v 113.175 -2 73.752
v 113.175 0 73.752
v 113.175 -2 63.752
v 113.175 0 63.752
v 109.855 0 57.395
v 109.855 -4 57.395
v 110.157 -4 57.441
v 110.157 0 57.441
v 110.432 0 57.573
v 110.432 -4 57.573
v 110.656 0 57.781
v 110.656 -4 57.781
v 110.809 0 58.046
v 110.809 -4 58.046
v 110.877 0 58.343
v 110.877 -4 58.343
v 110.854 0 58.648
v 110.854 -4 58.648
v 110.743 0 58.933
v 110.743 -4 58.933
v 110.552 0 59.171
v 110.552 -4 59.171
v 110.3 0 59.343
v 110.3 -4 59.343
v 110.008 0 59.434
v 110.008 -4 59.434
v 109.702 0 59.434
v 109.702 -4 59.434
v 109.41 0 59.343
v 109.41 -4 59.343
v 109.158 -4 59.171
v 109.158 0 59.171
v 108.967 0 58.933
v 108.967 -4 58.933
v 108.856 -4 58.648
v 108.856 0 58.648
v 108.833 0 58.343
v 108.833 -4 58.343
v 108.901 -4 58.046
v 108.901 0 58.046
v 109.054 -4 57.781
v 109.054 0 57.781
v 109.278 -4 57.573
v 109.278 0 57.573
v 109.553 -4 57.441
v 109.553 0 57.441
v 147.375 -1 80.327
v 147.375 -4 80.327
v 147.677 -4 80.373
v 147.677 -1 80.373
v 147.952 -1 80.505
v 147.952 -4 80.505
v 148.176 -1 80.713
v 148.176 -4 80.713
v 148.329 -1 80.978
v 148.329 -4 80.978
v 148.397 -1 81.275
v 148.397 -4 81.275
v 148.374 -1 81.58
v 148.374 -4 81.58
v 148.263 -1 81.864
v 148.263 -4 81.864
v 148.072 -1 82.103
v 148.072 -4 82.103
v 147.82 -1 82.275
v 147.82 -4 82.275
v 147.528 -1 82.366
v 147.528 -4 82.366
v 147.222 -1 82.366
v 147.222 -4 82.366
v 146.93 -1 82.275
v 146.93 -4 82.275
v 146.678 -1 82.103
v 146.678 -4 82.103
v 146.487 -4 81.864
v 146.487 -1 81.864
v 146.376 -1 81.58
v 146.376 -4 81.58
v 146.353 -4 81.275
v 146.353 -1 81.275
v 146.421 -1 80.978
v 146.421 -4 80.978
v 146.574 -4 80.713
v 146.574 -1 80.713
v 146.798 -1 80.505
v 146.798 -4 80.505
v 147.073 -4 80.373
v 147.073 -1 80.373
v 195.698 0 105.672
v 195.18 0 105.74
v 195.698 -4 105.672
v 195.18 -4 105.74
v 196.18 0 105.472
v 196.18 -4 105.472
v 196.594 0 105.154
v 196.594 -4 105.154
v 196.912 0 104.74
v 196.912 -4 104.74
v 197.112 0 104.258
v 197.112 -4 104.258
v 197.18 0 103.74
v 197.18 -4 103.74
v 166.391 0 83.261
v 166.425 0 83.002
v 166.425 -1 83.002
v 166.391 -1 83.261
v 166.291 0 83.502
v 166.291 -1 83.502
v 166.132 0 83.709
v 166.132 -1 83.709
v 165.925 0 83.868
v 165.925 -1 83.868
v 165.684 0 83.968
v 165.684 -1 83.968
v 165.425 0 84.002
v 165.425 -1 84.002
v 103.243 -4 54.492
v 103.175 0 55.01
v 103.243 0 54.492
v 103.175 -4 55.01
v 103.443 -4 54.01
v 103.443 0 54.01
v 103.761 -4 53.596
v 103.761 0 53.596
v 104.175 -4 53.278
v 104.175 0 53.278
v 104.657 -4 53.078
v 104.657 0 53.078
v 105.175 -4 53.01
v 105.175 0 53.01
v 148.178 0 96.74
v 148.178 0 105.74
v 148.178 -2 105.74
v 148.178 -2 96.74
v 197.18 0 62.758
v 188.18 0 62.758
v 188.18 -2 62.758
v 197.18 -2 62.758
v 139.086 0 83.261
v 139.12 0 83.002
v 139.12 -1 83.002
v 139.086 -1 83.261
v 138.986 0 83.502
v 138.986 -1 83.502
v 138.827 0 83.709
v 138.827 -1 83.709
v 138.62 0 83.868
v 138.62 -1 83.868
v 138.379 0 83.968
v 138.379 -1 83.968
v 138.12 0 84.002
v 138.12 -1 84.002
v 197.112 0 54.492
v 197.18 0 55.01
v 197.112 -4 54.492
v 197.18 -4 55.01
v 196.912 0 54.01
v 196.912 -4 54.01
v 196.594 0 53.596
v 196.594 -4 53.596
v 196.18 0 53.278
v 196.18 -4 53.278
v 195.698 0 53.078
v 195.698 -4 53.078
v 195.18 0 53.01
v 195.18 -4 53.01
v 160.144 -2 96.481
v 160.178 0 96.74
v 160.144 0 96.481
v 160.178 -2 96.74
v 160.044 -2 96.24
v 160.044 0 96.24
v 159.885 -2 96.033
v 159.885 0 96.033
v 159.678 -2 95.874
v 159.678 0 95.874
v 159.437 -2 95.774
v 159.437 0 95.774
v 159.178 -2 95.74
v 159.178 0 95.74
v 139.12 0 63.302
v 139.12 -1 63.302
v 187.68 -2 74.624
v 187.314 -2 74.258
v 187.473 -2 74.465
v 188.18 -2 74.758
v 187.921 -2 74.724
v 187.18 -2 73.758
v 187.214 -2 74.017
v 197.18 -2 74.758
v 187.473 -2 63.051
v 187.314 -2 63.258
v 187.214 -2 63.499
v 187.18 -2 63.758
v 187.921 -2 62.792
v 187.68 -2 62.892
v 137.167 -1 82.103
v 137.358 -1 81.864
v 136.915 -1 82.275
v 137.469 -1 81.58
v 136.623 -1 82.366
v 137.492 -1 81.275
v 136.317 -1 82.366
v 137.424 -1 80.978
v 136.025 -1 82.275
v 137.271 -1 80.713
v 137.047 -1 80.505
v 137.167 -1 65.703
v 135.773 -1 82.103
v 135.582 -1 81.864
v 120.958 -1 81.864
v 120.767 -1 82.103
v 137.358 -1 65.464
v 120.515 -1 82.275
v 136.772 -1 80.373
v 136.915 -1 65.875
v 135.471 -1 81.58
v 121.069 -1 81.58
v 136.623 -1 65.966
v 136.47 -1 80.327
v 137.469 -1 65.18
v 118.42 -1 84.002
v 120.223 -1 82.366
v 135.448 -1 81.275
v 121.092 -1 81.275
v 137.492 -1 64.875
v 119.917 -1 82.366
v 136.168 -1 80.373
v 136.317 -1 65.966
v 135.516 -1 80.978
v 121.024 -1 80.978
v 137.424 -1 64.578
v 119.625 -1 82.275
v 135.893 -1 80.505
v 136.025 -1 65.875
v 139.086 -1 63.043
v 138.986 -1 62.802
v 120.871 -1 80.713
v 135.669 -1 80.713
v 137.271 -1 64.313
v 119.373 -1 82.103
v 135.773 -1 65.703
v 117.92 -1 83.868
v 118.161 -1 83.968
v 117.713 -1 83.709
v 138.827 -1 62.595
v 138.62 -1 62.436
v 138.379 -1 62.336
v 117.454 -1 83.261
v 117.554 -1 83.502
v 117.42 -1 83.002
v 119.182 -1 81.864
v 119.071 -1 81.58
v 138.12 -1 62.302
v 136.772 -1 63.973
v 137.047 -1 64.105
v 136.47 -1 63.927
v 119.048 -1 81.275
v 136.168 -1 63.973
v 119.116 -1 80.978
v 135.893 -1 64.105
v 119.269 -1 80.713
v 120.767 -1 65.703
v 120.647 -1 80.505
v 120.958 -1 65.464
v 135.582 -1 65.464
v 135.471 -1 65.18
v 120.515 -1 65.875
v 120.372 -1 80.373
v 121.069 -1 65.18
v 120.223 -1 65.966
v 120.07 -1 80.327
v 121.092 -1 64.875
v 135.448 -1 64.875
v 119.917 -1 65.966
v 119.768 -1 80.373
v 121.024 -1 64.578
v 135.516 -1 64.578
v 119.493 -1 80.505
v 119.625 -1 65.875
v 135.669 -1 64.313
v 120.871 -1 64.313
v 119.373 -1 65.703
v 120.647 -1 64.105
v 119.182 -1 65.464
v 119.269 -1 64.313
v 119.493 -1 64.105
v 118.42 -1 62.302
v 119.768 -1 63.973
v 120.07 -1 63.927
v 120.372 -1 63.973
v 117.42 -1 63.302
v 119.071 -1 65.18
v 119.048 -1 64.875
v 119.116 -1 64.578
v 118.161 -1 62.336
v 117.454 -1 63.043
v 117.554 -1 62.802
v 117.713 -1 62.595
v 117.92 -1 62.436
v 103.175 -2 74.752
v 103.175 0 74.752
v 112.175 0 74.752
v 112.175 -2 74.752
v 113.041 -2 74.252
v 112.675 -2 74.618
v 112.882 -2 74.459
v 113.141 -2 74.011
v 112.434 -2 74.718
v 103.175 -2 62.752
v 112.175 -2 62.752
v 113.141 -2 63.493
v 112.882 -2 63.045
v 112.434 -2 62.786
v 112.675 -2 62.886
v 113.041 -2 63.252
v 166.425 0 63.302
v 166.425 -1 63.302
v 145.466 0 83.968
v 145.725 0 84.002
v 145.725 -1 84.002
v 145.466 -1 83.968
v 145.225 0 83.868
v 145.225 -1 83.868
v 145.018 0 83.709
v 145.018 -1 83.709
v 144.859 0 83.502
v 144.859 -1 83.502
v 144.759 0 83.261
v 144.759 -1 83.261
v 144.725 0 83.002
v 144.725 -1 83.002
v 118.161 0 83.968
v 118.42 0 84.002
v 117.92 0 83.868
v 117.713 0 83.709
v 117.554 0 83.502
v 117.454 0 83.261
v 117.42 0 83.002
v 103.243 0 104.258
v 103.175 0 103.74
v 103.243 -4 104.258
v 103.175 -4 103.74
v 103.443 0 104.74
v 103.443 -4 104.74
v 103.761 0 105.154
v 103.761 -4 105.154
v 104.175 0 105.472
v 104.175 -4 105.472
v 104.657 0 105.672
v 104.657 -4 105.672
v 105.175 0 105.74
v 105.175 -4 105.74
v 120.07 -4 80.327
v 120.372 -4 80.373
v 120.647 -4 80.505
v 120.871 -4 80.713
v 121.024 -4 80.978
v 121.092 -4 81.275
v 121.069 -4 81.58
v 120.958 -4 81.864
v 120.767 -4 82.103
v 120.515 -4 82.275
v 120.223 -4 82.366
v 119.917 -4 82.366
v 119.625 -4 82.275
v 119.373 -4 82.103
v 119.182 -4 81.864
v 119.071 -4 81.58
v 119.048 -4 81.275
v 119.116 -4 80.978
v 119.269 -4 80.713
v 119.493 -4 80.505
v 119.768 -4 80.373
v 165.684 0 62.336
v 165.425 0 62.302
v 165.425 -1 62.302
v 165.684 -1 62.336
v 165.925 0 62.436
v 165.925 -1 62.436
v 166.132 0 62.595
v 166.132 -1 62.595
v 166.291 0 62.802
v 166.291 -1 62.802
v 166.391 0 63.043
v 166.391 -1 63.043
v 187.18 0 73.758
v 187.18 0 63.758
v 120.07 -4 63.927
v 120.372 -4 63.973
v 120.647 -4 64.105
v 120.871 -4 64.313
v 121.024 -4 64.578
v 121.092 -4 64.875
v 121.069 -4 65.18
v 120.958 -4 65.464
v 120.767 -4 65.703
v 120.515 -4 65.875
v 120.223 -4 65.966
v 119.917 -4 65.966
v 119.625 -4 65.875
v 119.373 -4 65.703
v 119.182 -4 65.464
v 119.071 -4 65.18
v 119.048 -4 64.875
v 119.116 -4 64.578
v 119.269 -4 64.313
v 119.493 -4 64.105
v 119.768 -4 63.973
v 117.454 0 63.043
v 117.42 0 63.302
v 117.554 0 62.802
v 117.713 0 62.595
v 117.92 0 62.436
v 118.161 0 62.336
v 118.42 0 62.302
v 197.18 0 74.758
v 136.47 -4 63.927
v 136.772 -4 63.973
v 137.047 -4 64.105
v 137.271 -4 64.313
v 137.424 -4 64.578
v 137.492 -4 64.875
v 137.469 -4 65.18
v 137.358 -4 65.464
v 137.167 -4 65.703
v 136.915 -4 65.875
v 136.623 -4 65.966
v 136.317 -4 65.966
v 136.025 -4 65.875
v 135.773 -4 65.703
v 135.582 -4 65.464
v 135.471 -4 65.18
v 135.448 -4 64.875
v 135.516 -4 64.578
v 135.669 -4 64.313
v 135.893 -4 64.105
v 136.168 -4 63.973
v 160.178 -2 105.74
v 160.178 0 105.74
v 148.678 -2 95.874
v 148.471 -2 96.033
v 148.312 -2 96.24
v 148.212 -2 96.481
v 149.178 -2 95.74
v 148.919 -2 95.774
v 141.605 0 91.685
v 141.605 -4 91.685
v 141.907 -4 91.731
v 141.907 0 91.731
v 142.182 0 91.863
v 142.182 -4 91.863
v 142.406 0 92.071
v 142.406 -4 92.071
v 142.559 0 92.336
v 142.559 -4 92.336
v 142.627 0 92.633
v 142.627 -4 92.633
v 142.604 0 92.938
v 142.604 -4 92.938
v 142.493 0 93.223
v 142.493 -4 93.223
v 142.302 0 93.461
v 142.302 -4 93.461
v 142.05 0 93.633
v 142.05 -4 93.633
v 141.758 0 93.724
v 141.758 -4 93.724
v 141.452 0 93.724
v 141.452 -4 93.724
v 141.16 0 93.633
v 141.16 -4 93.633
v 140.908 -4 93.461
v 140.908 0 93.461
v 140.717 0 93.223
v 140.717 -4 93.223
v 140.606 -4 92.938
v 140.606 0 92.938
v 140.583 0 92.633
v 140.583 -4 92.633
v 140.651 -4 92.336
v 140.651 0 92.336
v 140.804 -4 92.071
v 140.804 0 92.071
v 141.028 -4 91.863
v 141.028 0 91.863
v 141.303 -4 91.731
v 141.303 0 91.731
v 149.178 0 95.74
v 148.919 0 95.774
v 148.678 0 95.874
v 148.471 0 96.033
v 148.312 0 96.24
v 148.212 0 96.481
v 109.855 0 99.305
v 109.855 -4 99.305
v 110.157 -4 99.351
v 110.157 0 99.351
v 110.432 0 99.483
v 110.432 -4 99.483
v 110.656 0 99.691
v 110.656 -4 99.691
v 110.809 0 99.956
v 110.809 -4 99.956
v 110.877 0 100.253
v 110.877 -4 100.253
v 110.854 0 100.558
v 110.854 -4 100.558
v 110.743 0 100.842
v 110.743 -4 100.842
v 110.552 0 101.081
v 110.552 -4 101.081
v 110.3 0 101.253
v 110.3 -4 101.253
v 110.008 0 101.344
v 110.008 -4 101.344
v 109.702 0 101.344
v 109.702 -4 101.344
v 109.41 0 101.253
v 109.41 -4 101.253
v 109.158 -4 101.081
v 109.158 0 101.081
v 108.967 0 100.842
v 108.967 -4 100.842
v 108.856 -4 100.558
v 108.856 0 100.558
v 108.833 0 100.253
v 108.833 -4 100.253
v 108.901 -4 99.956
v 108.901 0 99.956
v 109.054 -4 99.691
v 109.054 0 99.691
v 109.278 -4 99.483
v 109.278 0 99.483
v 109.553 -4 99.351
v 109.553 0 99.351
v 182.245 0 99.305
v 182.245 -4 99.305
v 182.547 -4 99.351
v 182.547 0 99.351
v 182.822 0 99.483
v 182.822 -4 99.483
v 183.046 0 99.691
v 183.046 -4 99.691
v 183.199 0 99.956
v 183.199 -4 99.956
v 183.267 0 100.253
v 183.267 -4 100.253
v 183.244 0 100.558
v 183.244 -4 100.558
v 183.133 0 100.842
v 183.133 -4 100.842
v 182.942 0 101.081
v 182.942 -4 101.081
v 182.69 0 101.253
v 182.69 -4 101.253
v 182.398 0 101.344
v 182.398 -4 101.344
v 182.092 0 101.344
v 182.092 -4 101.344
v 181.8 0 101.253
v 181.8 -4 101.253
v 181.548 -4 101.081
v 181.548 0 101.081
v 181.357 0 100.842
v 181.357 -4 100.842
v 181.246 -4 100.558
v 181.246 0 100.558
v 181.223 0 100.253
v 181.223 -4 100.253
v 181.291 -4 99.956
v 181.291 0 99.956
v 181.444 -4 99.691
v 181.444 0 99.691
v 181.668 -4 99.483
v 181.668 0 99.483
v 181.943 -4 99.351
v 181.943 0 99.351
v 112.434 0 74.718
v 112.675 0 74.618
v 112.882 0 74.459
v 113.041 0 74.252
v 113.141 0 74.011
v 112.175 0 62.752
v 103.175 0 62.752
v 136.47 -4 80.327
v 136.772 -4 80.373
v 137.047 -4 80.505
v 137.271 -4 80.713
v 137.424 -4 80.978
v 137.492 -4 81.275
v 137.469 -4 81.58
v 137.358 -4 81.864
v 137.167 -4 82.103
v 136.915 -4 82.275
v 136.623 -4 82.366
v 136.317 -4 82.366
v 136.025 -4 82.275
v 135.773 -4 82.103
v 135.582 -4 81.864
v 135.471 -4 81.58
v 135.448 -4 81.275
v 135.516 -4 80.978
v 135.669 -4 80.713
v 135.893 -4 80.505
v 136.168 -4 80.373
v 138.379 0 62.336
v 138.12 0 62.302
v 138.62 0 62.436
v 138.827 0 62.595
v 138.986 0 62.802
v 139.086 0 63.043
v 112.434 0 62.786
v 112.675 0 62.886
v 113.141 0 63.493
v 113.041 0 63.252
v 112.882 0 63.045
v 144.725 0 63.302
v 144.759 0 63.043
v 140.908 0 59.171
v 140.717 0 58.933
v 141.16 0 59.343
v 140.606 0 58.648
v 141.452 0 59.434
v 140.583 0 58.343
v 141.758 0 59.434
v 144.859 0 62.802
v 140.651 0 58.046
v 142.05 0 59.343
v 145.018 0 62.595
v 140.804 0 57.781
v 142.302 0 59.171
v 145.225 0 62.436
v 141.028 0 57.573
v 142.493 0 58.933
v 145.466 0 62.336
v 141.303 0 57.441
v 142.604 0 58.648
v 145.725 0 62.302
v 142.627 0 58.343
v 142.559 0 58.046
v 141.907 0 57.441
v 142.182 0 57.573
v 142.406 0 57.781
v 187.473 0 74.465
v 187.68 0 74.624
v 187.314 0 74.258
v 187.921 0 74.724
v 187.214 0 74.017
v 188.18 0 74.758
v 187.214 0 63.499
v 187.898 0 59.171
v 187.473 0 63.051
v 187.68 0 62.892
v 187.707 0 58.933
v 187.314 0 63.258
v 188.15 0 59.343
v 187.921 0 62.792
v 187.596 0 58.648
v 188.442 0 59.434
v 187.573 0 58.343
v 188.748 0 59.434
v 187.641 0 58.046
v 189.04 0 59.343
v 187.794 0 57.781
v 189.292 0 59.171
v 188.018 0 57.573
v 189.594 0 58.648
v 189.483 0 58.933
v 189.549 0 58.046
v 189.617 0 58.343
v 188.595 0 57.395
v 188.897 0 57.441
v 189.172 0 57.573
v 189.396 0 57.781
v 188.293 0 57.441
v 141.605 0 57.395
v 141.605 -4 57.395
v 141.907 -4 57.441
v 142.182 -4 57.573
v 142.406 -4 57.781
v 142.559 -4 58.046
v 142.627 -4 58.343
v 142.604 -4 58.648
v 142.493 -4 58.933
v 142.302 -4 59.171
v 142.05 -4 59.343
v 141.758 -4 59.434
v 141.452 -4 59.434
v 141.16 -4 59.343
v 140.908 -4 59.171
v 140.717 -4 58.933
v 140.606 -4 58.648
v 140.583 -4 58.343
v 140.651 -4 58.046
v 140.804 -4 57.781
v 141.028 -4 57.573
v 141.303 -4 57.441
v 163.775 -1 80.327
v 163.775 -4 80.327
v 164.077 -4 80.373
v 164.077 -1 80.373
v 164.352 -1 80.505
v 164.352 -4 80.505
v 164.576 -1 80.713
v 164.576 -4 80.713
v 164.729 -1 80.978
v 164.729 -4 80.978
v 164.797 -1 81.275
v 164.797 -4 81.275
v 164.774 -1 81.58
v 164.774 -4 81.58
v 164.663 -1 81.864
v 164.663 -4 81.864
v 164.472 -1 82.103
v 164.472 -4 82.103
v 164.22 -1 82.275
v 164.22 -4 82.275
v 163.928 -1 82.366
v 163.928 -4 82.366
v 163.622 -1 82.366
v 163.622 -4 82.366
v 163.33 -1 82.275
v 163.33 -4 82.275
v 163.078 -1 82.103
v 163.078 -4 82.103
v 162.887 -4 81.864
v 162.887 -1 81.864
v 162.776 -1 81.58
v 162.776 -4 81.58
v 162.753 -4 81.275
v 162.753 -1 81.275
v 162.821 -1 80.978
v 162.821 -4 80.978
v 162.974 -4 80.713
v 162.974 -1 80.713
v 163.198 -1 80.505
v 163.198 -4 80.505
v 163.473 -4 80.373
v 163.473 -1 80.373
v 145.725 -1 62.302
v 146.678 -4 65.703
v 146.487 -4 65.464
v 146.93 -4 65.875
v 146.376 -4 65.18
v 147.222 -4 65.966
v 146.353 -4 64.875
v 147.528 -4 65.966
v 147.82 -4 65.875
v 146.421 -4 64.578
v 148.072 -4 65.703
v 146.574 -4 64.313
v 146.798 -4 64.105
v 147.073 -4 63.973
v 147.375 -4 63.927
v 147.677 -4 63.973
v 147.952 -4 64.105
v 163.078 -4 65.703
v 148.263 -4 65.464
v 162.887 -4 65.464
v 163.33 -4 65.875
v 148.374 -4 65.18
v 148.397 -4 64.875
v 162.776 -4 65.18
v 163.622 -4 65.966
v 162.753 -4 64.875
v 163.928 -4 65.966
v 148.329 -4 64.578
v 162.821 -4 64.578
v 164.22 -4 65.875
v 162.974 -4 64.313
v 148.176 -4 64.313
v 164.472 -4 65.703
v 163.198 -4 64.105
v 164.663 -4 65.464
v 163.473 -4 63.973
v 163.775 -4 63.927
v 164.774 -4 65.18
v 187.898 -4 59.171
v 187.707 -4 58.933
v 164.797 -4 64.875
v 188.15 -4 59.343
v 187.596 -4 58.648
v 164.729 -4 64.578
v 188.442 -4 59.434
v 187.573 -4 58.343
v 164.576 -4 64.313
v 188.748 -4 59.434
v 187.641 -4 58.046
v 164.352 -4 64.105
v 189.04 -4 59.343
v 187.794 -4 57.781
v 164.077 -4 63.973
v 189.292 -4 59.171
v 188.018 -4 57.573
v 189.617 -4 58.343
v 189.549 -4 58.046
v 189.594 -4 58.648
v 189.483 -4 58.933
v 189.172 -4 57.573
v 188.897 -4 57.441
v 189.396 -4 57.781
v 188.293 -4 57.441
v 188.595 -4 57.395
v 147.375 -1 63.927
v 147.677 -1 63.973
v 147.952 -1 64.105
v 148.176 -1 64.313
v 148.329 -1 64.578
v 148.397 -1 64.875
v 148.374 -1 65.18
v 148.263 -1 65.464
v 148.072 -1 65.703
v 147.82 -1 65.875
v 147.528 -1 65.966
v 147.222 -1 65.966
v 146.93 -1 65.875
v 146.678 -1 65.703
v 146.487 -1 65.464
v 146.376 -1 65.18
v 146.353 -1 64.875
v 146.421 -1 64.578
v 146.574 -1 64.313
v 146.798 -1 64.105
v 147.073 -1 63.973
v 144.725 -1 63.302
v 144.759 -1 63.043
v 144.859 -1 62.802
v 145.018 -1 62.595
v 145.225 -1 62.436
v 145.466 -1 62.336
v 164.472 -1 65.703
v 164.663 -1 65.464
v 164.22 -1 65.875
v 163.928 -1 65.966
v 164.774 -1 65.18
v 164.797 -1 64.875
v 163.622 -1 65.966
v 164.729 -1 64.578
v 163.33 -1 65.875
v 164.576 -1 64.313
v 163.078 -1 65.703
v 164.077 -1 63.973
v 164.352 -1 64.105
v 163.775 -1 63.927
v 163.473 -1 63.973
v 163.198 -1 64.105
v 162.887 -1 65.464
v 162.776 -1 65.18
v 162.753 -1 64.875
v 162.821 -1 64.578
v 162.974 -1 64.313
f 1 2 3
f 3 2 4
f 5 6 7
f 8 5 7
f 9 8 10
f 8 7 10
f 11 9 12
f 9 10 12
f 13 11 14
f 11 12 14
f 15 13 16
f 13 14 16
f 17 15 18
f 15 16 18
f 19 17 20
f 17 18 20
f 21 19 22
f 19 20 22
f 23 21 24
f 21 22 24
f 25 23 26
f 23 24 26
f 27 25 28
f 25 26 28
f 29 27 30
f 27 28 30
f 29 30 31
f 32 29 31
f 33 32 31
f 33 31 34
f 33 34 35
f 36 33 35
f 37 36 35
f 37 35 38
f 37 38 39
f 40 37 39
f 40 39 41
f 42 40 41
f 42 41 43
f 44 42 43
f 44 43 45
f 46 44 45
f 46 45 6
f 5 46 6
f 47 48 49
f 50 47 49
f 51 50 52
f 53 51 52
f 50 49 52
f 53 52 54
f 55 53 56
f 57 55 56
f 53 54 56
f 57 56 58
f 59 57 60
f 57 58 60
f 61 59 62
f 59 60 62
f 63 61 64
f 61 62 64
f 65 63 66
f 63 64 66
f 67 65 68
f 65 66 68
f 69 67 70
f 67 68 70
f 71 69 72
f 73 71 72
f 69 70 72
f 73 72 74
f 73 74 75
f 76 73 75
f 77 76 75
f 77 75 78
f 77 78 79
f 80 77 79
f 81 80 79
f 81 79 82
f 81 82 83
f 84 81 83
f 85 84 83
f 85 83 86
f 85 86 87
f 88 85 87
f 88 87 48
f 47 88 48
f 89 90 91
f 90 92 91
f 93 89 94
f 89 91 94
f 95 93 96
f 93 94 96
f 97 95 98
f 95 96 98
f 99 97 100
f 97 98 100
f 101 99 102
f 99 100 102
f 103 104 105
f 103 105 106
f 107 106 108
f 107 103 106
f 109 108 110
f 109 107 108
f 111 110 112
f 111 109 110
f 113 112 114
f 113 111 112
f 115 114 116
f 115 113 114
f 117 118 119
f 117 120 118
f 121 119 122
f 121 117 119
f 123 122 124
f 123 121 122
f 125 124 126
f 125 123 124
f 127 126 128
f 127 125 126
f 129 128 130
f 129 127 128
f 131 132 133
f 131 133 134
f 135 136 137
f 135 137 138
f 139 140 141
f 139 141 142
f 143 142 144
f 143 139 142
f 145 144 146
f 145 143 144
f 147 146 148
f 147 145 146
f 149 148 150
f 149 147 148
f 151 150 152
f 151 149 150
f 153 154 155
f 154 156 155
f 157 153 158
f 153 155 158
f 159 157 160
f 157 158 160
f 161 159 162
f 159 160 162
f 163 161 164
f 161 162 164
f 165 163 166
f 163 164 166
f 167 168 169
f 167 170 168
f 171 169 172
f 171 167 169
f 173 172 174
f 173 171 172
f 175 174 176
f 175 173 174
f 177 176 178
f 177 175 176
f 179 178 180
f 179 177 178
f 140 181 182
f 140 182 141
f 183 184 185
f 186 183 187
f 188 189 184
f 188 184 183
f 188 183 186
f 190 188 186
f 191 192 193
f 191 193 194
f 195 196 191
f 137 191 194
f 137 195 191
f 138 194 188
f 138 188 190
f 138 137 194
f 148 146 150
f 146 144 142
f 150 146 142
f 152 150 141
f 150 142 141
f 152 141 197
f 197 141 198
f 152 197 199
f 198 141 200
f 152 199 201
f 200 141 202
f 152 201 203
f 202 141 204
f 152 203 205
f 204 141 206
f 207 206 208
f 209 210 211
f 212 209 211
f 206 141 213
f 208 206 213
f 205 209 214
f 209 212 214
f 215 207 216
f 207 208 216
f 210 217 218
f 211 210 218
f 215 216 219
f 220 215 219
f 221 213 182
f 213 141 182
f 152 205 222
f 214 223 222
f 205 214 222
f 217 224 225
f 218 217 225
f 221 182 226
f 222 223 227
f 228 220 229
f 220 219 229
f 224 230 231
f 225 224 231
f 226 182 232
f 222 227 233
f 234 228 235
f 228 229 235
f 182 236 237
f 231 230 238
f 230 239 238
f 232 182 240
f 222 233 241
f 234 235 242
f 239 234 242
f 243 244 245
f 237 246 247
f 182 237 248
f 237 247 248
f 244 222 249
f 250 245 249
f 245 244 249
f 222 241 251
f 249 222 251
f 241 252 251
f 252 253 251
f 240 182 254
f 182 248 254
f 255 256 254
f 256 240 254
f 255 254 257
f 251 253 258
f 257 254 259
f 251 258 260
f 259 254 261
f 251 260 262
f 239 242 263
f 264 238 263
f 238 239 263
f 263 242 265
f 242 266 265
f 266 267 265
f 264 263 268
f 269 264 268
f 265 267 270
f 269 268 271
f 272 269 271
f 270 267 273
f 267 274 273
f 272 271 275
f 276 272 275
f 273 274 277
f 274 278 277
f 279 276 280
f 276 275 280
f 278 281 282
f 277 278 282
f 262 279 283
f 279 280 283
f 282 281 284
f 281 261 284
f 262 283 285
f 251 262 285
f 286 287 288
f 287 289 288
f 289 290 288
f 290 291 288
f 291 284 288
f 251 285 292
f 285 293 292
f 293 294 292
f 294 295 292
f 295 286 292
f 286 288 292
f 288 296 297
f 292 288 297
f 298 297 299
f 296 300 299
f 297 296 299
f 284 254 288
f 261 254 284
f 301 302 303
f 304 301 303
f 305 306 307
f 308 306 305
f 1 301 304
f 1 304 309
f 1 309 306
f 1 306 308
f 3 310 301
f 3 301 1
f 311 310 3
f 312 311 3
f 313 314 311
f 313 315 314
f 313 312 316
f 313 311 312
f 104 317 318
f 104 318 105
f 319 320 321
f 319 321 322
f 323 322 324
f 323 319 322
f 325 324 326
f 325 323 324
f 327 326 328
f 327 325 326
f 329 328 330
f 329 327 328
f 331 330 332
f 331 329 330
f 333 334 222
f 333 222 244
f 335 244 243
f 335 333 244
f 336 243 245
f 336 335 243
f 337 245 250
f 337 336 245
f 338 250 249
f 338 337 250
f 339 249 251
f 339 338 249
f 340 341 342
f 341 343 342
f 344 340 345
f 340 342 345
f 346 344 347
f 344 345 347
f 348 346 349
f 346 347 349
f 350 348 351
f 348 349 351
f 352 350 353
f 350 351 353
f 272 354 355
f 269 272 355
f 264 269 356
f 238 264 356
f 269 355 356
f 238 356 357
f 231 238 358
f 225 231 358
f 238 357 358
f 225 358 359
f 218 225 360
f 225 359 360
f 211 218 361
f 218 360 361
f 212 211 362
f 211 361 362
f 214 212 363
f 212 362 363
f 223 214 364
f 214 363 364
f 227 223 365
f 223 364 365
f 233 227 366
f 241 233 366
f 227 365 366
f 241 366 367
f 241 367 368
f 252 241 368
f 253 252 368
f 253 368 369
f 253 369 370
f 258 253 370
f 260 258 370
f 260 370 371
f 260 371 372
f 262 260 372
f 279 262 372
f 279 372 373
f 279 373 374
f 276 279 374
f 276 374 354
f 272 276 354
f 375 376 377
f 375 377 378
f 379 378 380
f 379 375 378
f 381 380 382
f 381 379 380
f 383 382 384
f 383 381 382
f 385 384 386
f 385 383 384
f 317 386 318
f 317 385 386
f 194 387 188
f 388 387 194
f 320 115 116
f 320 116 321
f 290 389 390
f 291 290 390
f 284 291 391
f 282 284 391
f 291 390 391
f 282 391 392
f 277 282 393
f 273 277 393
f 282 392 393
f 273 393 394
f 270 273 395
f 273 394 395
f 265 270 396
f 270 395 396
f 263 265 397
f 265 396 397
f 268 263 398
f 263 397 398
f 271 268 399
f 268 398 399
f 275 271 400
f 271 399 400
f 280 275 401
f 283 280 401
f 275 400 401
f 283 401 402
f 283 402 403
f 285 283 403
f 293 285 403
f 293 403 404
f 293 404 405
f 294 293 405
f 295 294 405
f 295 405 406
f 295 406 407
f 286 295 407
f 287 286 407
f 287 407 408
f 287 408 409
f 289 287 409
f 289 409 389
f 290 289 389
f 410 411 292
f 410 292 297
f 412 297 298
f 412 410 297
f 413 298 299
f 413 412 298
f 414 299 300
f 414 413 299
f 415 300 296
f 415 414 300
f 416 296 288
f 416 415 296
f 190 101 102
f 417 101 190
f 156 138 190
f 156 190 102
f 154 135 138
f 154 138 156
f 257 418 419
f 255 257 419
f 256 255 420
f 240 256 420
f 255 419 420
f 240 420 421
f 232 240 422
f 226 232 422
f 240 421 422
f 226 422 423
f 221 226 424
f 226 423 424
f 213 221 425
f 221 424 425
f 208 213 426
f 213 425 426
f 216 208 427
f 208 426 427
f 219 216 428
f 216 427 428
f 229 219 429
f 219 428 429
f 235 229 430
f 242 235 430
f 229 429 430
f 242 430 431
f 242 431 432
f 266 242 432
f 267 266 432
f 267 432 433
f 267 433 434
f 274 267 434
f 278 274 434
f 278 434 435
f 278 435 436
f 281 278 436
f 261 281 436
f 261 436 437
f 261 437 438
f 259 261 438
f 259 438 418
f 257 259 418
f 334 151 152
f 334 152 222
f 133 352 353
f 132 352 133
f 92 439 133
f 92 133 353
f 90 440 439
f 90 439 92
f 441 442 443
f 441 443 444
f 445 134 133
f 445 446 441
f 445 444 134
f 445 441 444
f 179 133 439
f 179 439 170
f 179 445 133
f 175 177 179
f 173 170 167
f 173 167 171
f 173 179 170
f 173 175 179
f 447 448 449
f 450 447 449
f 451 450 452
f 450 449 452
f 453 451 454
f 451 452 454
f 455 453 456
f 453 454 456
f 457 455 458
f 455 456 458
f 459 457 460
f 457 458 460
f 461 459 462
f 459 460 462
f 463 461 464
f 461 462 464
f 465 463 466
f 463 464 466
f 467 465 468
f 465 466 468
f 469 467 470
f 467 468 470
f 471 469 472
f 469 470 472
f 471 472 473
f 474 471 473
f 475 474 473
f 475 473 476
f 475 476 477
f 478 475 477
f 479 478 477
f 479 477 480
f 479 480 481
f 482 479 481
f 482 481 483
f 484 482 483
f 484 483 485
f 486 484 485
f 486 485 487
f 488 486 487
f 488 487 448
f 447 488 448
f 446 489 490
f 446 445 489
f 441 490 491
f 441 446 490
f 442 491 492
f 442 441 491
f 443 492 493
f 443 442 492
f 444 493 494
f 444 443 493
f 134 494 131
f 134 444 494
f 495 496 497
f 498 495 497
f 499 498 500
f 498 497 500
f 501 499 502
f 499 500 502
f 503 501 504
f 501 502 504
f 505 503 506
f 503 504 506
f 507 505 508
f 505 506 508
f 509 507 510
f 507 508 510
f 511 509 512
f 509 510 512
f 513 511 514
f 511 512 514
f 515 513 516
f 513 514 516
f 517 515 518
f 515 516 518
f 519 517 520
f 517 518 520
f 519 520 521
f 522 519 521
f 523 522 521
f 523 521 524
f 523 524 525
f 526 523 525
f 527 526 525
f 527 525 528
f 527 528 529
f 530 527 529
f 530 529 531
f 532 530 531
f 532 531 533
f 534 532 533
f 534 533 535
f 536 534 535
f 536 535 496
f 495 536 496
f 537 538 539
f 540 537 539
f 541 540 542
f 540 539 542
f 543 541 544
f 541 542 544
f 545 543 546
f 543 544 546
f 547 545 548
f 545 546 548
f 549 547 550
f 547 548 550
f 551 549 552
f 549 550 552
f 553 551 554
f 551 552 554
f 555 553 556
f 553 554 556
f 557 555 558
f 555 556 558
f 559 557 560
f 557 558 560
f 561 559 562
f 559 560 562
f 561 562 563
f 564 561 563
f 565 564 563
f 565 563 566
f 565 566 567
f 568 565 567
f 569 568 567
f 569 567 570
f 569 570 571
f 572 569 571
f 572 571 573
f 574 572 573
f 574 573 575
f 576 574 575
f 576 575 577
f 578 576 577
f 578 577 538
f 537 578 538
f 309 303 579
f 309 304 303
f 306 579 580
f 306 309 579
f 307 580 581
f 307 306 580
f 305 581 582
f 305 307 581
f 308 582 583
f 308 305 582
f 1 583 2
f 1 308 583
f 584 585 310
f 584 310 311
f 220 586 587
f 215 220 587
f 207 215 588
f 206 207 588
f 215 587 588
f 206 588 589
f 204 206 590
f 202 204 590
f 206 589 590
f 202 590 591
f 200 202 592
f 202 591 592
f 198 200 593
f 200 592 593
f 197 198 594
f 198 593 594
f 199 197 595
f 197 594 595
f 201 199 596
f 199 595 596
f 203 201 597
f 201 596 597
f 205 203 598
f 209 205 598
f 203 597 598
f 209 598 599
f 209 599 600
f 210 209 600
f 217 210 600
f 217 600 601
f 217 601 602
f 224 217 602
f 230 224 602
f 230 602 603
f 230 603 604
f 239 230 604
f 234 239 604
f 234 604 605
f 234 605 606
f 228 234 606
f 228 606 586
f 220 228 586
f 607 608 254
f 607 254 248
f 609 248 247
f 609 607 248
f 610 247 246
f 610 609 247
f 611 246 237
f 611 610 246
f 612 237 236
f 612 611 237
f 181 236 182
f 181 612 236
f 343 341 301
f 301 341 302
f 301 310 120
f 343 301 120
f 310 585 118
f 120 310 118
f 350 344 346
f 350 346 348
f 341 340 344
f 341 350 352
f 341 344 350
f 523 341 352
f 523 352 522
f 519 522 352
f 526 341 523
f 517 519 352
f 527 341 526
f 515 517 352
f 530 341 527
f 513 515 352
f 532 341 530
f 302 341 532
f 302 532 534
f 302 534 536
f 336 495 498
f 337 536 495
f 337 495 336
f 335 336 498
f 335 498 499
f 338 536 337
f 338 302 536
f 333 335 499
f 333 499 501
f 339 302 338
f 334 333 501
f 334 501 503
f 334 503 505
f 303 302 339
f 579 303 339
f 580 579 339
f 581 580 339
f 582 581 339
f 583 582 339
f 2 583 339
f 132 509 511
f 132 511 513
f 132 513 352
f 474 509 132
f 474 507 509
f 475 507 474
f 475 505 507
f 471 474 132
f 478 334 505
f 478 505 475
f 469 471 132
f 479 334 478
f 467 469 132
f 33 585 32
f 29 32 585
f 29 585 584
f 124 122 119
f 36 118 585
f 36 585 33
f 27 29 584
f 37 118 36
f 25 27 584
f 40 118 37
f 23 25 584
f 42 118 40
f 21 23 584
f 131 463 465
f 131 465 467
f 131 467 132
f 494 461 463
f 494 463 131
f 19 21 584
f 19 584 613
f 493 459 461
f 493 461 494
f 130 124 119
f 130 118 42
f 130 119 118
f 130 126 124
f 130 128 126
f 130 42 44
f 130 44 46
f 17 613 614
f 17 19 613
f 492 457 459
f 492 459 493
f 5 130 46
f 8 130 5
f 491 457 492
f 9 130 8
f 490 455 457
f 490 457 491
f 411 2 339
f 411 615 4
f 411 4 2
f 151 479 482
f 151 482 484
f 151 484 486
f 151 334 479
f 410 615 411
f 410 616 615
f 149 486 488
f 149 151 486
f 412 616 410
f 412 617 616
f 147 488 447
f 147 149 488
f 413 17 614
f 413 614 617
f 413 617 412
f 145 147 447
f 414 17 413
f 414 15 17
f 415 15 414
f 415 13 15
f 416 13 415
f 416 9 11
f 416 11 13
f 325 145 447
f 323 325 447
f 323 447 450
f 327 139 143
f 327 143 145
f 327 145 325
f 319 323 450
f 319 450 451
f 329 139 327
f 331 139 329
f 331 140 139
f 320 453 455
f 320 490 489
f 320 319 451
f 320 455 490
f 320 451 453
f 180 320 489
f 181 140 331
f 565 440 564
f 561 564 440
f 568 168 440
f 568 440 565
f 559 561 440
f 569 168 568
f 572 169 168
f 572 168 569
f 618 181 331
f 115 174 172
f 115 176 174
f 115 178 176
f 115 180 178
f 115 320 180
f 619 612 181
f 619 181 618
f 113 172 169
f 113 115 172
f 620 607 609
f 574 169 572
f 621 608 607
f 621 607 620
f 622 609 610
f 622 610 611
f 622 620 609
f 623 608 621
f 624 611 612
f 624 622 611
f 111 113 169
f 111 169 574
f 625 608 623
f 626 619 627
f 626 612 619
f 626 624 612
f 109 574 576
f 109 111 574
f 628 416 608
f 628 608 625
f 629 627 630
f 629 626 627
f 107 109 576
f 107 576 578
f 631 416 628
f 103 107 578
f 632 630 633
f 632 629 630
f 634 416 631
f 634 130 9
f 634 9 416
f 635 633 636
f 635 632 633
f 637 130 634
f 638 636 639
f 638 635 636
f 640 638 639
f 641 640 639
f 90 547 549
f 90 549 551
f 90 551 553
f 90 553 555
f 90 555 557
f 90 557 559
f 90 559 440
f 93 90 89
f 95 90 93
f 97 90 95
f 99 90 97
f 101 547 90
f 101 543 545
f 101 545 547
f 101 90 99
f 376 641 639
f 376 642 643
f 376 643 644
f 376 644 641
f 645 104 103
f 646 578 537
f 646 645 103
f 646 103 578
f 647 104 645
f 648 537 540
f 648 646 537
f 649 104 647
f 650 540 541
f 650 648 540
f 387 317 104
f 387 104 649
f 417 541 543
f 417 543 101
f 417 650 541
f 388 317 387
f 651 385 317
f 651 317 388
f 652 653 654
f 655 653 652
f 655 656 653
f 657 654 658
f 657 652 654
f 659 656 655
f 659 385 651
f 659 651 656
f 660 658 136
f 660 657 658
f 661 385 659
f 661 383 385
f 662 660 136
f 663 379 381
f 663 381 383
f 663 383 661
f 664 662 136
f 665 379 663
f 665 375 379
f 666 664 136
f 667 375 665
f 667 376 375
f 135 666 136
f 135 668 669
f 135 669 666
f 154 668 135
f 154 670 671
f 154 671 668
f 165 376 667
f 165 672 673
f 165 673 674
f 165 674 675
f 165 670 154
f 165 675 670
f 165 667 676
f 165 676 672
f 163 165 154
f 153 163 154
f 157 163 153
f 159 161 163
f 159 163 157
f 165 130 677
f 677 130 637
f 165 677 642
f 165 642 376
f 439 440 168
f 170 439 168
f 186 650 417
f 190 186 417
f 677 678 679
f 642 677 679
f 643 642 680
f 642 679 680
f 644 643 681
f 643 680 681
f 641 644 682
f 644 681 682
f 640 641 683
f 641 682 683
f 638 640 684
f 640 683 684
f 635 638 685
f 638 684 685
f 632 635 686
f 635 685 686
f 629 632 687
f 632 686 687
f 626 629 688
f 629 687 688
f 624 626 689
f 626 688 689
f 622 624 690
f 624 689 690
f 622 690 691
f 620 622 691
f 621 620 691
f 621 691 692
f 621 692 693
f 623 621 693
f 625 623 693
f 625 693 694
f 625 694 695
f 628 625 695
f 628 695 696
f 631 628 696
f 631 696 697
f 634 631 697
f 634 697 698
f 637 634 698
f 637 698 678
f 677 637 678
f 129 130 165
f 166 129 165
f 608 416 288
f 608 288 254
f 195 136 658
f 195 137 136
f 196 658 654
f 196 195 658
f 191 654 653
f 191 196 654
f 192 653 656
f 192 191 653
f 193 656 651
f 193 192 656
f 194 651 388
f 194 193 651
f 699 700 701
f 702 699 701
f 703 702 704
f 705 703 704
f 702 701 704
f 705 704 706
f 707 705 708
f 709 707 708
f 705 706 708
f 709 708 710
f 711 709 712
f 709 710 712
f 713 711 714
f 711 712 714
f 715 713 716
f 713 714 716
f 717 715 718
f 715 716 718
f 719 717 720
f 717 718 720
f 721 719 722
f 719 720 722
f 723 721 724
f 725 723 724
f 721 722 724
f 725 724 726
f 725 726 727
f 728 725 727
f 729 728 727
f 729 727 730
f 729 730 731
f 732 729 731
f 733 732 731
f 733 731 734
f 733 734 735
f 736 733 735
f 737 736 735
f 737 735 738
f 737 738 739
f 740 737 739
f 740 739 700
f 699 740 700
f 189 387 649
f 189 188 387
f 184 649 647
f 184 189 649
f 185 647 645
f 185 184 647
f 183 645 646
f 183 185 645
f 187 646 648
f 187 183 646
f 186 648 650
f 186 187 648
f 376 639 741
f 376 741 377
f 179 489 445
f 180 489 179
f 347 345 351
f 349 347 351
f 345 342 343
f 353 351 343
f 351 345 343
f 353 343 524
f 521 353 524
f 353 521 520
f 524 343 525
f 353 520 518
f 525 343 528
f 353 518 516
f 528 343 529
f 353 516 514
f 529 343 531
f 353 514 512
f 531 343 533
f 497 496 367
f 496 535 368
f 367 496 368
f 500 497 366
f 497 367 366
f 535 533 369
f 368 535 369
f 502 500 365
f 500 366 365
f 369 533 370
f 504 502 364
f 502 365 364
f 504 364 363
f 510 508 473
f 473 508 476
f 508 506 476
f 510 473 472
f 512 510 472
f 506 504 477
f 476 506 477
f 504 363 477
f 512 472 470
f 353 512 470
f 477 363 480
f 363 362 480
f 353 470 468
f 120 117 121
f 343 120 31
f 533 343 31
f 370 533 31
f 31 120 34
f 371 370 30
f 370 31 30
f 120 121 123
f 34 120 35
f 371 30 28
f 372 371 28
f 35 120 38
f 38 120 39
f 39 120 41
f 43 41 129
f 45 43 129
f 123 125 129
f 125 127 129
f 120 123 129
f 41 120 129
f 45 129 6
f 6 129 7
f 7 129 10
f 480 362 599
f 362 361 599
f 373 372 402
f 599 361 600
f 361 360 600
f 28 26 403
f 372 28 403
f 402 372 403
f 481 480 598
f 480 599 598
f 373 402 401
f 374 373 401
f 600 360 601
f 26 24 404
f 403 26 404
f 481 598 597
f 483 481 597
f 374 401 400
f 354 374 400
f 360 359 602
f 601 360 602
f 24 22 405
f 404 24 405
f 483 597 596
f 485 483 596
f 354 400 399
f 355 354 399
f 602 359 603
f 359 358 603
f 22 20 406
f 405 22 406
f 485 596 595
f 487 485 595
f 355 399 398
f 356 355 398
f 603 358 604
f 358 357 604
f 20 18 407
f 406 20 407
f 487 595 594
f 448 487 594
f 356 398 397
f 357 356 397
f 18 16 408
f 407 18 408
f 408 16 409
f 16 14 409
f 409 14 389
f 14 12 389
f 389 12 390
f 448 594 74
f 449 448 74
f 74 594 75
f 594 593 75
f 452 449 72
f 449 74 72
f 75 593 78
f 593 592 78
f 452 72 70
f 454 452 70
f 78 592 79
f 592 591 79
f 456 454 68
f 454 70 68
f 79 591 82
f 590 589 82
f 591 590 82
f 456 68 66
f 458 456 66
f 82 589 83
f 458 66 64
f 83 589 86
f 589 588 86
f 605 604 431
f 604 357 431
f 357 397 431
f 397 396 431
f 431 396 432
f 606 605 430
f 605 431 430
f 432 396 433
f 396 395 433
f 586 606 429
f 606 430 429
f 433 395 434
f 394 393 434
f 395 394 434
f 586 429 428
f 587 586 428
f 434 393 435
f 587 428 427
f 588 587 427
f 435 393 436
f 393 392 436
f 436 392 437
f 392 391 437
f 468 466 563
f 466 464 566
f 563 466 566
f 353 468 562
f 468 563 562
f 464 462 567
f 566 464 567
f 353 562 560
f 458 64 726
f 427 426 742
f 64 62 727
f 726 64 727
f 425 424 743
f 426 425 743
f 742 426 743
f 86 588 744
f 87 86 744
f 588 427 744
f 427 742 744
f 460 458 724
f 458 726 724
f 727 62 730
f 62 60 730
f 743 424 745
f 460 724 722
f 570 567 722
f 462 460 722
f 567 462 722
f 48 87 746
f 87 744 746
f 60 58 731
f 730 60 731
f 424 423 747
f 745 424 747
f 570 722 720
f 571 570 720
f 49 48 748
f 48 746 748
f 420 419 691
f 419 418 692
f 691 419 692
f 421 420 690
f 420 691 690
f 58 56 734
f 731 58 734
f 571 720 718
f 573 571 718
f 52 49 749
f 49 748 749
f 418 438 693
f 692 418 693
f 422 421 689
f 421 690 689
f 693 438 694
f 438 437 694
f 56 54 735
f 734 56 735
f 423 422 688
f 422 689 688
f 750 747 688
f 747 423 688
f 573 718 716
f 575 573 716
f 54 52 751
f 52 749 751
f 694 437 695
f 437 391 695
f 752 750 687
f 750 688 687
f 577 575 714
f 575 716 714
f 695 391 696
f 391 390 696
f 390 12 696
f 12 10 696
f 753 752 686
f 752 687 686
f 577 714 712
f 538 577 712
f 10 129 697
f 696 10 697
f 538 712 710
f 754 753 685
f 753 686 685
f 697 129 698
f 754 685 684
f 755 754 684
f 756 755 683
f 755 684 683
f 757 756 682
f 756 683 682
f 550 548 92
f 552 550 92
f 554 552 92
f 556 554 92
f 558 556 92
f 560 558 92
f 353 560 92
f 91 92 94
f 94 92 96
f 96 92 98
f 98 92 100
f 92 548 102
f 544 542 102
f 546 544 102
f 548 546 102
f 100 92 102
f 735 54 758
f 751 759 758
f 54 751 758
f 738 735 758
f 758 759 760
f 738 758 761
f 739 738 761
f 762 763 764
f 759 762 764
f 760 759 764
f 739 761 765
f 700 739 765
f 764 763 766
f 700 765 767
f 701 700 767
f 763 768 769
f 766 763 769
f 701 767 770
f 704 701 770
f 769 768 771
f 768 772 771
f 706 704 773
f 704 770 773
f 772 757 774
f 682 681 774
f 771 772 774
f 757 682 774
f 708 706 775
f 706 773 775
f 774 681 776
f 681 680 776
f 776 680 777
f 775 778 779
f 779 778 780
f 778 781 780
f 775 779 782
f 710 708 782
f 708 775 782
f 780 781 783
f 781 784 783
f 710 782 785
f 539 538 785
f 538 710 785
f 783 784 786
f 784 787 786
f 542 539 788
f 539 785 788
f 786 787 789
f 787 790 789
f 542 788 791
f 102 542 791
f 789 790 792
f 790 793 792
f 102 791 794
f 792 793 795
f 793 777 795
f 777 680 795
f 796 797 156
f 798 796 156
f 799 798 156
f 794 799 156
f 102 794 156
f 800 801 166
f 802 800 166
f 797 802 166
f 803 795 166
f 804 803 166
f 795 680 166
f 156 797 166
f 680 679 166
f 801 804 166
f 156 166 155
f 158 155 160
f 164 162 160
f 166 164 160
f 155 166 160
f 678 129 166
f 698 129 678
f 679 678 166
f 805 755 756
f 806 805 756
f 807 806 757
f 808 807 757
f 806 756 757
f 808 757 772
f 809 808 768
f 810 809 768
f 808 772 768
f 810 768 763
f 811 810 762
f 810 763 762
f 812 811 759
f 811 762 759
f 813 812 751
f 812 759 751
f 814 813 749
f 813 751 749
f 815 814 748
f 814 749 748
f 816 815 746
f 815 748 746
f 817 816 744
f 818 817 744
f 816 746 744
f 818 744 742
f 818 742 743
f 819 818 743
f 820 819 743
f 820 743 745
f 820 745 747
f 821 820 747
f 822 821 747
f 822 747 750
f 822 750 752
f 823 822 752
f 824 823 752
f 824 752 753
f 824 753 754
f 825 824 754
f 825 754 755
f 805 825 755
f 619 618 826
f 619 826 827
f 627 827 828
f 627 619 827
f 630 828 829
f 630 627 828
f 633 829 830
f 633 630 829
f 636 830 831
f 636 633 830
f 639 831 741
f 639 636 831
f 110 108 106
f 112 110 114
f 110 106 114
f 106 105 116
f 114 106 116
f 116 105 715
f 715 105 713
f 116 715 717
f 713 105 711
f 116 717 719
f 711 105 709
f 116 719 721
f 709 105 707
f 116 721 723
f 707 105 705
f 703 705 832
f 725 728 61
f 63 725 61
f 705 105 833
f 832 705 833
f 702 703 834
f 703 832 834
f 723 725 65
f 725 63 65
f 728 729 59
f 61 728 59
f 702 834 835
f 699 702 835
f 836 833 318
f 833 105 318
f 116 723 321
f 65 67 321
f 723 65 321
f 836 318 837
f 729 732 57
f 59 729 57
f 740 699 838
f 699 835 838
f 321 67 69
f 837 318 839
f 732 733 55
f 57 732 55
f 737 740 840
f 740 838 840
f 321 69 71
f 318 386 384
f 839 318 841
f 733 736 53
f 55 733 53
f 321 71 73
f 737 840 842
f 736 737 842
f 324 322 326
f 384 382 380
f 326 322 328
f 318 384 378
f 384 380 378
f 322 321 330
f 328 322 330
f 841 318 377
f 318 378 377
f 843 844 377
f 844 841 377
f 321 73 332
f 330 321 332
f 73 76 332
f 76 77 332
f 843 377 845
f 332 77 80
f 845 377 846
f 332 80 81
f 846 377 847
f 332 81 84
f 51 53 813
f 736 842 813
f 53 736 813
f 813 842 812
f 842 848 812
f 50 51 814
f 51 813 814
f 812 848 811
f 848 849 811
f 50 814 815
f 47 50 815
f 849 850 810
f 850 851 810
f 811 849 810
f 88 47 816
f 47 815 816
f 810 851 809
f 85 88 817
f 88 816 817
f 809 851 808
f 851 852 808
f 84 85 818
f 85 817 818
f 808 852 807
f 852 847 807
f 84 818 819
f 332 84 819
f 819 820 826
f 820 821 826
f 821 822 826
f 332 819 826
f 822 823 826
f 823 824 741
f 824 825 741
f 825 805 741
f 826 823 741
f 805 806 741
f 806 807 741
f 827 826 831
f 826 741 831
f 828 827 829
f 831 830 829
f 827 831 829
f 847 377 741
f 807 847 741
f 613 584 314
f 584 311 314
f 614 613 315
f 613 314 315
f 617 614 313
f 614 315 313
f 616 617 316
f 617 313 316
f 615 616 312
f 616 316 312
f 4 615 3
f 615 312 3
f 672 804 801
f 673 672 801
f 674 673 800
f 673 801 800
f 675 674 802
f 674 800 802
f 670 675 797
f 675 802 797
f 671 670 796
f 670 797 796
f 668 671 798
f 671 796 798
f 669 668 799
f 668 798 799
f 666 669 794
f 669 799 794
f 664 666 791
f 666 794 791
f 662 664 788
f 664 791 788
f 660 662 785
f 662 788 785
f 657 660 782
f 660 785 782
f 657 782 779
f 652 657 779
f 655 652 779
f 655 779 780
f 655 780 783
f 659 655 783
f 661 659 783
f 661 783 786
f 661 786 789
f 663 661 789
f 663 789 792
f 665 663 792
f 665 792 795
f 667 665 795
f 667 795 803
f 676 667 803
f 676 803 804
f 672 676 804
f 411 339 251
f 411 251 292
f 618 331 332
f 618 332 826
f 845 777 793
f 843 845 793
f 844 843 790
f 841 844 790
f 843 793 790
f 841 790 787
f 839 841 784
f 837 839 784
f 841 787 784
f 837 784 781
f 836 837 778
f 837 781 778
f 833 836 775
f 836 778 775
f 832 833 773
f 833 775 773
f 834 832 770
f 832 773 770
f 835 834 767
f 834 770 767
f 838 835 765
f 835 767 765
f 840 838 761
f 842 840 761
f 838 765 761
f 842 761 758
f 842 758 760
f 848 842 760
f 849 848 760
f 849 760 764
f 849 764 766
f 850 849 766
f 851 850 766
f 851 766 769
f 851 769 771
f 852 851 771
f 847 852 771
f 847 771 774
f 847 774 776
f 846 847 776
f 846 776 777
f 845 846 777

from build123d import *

# Parameters (mm, degrees)
SKETCH_2_W          = 94.005
SKETCH_2_H          = 52.73
EXTRUDE_1_DEPTH     = 4
FILLET_1_R          = 2
M2_5X0_45_1_D       = 2.05
CUT_EXTRUDE_1_DEPTH = 1
SKETCH_8_W          = 10
SKETCH_8_H          = 12
SKETCH_8_W_2        = 12
SKETCH_8_H_2        = 10
CUT_EXTRUDE_2_DEPTH = 2
FILLET_2_R          = 1


with BuildPart() as part:
    # 草图2 → 凸台-拉伸1 (new body)
    with BuildSketch(Plane(origin=(0, 0, 0), x_dir=(1, 0, 0), z_dir=(0, 1, 0))):
        with Locations((150.1775, -79.375)):
            Rectangle(SKETCH_2_W, SKETCH_2_H)
    extrude(amount=-EXTRUDE_1_DEPTH)

    # 圆角1
    fillet_1_edges = [part.edges().sort_by_distance(p)[0] for p in [
        (197.18, -2, 53.01),
        (197.18, -2, 105.74),
        (103.175, -2, 105.74),
        (103.175, -2, 53.01),
    ]]
    fillet(fillet_1_edges, radius=FILLET_1_R)

    # M2.5x0.45 螺纹孔1 (through all)
    with Locations(Plane(origin=(109.855, 0, 58.42), x_dir=(0, 0, 1), z_dir=(0, 1, 0))):
        with Locations((0, 0), (41.91, 0), (34.29, 31.75), (22.932, 26.615), (22.932, 10.215), (6.532, 10.215), (6.532, 26.615), (6.532, 37.52), (22.932, 37.52), (22.932, 53.92), (6.532, 53.92), (0, 78.74), (41.91, 72.39), (0, 31.75)):
            Hole(M2_5X0_45_1_D / 2)

    # 草图7 → 切除-拉伸1 (cut)
    with BuildSketch(Plane(origin=(0, 0, 0), x_dir=(1, 0, 0), z_dir=(0, 1, 0))):
        with BuildLine():
            Line((118.42, -62.302), (138.12, -62.302))
            ThreePointArc((138.12, -62.302), (138.827106781, -62.594893219), (139.12, -63.302))
            Line((139.12, -63.302), (139.12, -83.002))
            ThreePointArc((139.12, -83.002), (138.827106781, -83.709106781), (138.12, -84.002))
            Line((138.12, -84.002), (118.42, -84.002))
            ThreePointArc((118.42, -84.002), (117.712893219, -83.709106781), (117.42, -83.002))
            Line((117.42, -83.002), (117.42, -63.302))
            ThreePointArc((117.42, -63.302), (117.712893219, -62.594893219), (118.42, -62.302))
        make_face()
        with BuildLine():
            Line((145.725, -62.302), (165.425, -62.302))
            ThreePointArc((165.425, -62.302), (166.132106781, -62.594893219), (166.425, -63.302))
            Line((166.425, -63.302), (166.425, -83.002))
            ThreePointArc((166.425, -83.002), (166.132106781, -83.709106781), (165.425, -84.002))
            Line((165.425, -84.002), (145.725, -84.002))
            ThreePointArc((145.725, -84.002), (145.017893219, -83.709106781), (144.725, -83.002))
            Line((144.725, -83.002), (144.725, -63.302))
            ThreePointArc((144.725, -63.302), (145.017893219, -62.594893219), (145.725, -62.302))
        make_face()
    extrude(amount=-CUT_EXTRUDE_1_DEPTH, mode=Mode.SUBTRACT)

    # 草图8 → 切除-拉伸2 (cut)
    with BuildSketch(Plane(origin=(0, 0, 0), x_dir=(1, 0, 0), z_dir=(0, 1, 0))):
        with Locations((108.175, -68.752)):
            Rectangle(SKETCH_8_W, SKETCH_8_H)
        with Locations((192.18, -68.758)):
            Rectangle(SKETCH_8_W, SKETCH_8_H)
        with Locations((154.178, -100.74)):
            Rectangle(SKETCH_8_W_2, SKETCH_8_H_2)
    extrude(amount=-CUT_EXTRUDE_2_DEPTH, mode=Mode.SUBTRACT)

    # 圆角2
    fillet_2_edges = [part.edges().sort_by_distance(p)[0] for p in [
        (113.175, -1, 62.752),
        (113.175, -1, 74.752),
        (187.18, -1, 74.758),
        (187.18, -1, 62.758),
        (148.178, -1, 95.74),
        (160.178, -1, 95.74),
    ]]
    fillet(fillet_2_edges, radius=FILLET_2_R)


solid = part.part
